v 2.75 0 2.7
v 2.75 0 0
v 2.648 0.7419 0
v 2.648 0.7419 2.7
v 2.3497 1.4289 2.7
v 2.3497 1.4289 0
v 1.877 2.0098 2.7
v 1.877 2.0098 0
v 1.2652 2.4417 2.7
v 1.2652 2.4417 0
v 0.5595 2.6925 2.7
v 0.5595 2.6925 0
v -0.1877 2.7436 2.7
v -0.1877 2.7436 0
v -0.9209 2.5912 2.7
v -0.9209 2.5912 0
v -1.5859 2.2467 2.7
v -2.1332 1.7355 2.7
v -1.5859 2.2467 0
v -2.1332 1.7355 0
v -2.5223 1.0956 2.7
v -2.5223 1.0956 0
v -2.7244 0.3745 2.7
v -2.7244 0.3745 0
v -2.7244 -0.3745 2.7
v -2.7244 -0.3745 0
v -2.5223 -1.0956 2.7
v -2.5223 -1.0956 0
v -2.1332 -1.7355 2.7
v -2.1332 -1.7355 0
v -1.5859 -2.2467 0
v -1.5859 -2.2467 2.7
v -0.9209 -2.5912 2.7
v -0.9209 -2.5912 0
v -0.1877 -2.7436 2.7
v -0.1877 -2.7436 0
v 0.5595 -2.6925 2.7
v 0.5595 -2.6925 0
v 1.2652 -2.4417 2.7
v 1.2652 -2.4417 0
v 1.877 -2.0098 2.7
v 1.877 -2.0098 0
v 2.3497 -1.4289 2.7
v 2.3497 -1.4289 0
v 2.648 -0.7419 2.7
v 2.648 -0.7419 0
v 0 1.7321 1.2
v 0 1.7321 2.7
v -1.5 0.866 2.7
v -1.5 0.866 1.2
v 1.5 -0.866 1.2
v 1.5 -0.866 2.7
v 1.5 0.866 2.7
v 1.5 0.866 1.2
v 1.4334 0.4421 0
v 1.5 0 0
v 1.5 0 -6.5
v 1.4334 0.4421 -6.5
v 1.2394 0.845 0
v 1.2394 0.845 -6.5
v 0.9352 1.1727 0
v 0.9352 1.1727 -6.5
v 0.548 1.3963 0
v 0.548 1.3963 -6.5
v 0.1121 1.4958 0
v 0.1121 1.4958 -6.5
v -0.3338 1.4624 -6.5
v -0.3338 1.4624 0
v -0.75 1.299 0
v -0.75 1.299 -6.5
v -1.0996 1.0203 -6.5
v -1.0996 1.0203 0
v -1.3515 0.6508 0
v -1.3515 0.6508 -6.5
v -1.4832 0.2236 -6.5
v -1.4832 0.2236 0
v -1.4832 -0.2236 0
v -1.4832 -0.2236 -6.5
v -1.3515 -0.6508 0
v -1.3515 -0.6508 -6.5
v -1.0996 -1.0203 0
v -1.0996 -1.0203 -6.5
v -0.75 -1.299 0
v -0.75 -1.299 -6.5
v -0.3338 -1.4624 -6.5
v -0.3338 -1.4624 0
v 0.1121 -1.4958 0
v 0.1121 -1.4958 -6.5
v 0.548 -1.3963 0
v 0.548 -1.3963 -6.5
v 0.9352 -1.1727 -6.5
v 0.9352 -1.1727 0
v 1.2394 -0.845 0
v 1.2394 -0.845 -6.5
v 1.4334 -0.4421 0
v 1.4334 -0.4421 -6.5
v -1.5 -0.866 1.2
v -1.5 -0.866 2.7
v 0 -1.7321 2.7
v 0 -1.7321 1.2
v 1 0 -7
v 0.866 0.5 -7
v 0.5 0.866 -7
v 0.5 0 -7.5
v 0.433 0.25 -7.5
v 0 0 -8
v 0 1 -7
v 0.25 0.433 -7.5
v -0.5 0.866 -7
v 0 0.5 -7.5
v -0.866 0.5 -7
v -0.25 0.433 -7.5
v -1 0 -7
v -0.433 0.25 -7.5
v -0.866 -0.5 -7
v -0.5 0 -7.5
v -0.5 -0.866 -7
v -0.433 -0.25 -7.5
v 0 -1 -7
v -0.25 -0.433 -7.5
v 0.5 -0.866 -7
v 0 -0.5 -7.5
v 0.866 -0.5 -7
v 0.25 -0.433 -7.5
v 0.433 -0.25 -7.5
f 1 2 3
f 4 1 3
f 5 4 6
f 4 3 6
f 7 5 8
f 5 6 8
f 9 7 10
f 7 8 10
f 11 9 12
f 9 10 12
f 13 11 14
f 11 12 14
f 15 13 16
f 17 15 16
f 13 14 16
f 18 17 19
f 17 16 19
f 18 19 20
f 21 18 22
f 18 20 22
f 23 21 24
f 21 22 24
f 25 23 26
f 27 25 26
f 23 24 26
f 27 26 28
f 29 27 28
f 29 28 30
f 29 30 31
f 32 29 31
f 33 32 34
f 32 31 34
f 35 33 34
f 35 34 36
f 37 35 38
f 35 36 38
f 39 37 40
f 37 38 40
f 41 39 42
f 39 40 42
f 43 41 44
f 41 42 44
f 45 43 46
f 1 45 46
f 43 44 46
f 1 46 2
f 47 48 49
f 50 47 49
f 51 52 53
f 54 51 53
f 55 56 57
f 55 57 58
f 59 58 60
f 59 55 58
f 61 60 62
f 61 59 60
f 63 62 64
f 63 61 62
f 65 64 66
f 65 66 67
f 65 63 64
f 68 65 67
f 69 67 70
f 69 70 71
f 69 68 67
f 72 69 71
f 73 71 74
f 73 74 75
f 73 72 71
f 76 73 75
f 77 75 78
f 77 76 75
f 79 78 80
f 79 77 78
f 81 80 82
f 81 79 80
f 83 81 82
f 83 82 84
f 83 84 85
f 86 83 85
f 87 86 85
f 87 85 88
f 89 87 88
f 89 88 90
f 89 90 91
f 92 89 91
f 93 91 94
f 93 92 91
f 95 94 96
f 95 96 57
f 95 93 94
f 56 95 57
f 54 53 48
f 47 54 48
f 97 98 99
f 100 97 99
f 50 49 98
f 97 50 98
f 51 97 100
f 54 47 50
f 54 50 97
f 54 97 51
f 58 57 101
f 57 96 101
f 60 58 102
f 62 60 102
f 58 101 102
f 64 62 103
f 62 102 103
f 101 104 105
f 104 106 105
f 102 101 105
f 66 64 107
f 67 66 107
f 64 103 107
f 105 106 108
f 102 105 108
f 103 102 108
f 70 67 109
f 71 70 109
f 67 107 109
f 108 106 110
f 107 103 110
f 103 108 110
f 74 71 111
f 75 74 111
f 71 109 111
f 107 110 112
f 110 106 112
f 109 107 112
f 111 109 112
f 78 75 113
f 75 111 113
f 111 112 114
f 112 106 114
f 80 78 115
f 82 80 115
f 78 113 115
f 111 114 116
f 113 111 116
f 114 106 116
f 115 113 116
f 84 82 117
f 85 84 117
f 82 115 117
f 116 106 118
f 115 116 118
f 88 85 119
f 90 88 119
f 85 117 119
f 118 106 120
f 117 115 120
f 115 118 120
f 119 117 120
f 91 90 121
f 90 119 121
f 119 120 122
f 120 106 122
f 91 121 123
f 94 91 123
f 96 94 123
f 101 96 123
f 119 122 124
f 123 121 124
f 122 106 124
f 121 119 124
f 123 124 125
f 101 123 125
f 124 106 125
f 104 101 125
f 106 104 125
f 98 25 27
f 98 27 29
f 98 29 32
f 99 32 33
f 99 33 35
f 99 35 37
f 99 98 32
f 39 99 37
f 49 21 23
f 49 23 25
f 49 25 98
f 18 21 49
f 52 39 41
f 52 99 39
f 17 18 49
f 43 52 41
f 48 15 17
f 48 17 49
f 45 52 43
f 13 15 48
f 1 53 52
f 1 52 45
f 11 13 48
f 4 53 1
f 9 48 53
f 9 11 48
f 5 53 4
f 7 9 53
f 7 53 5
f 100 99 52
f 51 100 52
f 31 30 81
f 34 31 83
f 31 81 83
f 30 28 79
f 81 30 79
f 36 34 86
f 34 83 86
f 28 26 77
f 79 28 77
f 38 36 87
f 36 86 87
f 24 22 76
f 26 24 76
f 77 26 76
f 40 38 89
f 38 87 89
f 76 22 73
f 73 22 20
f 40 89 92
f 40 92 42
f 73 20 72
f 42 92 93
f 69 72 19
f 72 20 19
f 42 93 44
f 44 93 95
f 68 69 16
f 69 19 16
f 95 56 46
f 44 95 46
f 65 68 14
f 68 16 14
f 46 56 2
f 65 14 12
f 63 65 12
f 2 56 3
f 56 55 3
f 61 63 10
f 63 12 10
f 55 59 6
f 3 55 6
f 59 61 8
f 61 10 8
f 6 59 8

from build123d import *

# Parameters (mm, degrees)
F0_R     = 2.75
F0_R_2   = 1.5
F1_DEPTH = 2.7
F2_DEPTH = 8
F3_SIZE  = 1.5
F5_DEPTH = 1.5


with BuildPart() as f1:
    # F0 (on Top) → F1 (new body)
    with BuildSketch(Plane.XY):
        Circle(F0_R)
        Circle(F0_R_2, mode=Mode.SUBTRACT)
        Circle(F0_R_2)
    extrude(amount=F1_DEPTH)

    # F0 (on Top) → F2 (join)
    with BuildSketch(Plane.XY):
        Circle(F0_R_2)
    extrude(amount=-F2_DEPTH)

    # F3
    f3_edges = [f1.edges().sort_by_distance(p)[0] for p in [
        (-1.5, 0, -8),
    ]]
    chamfer(f3_edges, length=F3_SIZE)

    # F4 (on face) → F5 (cut)
    with BuildSketch(Plane.XY.offset(2.7)):
        Polygon((1.5, -0.866025), (1.5, 0.866025), (0, 1.732051), (-1.5, 0.866025), (-1.5, -0.866025), (0, -1.732051), align=None)
    extrude(amount=-F5_DEPTH, mode=Mode.SUBTRACT)


solid = f1.part
